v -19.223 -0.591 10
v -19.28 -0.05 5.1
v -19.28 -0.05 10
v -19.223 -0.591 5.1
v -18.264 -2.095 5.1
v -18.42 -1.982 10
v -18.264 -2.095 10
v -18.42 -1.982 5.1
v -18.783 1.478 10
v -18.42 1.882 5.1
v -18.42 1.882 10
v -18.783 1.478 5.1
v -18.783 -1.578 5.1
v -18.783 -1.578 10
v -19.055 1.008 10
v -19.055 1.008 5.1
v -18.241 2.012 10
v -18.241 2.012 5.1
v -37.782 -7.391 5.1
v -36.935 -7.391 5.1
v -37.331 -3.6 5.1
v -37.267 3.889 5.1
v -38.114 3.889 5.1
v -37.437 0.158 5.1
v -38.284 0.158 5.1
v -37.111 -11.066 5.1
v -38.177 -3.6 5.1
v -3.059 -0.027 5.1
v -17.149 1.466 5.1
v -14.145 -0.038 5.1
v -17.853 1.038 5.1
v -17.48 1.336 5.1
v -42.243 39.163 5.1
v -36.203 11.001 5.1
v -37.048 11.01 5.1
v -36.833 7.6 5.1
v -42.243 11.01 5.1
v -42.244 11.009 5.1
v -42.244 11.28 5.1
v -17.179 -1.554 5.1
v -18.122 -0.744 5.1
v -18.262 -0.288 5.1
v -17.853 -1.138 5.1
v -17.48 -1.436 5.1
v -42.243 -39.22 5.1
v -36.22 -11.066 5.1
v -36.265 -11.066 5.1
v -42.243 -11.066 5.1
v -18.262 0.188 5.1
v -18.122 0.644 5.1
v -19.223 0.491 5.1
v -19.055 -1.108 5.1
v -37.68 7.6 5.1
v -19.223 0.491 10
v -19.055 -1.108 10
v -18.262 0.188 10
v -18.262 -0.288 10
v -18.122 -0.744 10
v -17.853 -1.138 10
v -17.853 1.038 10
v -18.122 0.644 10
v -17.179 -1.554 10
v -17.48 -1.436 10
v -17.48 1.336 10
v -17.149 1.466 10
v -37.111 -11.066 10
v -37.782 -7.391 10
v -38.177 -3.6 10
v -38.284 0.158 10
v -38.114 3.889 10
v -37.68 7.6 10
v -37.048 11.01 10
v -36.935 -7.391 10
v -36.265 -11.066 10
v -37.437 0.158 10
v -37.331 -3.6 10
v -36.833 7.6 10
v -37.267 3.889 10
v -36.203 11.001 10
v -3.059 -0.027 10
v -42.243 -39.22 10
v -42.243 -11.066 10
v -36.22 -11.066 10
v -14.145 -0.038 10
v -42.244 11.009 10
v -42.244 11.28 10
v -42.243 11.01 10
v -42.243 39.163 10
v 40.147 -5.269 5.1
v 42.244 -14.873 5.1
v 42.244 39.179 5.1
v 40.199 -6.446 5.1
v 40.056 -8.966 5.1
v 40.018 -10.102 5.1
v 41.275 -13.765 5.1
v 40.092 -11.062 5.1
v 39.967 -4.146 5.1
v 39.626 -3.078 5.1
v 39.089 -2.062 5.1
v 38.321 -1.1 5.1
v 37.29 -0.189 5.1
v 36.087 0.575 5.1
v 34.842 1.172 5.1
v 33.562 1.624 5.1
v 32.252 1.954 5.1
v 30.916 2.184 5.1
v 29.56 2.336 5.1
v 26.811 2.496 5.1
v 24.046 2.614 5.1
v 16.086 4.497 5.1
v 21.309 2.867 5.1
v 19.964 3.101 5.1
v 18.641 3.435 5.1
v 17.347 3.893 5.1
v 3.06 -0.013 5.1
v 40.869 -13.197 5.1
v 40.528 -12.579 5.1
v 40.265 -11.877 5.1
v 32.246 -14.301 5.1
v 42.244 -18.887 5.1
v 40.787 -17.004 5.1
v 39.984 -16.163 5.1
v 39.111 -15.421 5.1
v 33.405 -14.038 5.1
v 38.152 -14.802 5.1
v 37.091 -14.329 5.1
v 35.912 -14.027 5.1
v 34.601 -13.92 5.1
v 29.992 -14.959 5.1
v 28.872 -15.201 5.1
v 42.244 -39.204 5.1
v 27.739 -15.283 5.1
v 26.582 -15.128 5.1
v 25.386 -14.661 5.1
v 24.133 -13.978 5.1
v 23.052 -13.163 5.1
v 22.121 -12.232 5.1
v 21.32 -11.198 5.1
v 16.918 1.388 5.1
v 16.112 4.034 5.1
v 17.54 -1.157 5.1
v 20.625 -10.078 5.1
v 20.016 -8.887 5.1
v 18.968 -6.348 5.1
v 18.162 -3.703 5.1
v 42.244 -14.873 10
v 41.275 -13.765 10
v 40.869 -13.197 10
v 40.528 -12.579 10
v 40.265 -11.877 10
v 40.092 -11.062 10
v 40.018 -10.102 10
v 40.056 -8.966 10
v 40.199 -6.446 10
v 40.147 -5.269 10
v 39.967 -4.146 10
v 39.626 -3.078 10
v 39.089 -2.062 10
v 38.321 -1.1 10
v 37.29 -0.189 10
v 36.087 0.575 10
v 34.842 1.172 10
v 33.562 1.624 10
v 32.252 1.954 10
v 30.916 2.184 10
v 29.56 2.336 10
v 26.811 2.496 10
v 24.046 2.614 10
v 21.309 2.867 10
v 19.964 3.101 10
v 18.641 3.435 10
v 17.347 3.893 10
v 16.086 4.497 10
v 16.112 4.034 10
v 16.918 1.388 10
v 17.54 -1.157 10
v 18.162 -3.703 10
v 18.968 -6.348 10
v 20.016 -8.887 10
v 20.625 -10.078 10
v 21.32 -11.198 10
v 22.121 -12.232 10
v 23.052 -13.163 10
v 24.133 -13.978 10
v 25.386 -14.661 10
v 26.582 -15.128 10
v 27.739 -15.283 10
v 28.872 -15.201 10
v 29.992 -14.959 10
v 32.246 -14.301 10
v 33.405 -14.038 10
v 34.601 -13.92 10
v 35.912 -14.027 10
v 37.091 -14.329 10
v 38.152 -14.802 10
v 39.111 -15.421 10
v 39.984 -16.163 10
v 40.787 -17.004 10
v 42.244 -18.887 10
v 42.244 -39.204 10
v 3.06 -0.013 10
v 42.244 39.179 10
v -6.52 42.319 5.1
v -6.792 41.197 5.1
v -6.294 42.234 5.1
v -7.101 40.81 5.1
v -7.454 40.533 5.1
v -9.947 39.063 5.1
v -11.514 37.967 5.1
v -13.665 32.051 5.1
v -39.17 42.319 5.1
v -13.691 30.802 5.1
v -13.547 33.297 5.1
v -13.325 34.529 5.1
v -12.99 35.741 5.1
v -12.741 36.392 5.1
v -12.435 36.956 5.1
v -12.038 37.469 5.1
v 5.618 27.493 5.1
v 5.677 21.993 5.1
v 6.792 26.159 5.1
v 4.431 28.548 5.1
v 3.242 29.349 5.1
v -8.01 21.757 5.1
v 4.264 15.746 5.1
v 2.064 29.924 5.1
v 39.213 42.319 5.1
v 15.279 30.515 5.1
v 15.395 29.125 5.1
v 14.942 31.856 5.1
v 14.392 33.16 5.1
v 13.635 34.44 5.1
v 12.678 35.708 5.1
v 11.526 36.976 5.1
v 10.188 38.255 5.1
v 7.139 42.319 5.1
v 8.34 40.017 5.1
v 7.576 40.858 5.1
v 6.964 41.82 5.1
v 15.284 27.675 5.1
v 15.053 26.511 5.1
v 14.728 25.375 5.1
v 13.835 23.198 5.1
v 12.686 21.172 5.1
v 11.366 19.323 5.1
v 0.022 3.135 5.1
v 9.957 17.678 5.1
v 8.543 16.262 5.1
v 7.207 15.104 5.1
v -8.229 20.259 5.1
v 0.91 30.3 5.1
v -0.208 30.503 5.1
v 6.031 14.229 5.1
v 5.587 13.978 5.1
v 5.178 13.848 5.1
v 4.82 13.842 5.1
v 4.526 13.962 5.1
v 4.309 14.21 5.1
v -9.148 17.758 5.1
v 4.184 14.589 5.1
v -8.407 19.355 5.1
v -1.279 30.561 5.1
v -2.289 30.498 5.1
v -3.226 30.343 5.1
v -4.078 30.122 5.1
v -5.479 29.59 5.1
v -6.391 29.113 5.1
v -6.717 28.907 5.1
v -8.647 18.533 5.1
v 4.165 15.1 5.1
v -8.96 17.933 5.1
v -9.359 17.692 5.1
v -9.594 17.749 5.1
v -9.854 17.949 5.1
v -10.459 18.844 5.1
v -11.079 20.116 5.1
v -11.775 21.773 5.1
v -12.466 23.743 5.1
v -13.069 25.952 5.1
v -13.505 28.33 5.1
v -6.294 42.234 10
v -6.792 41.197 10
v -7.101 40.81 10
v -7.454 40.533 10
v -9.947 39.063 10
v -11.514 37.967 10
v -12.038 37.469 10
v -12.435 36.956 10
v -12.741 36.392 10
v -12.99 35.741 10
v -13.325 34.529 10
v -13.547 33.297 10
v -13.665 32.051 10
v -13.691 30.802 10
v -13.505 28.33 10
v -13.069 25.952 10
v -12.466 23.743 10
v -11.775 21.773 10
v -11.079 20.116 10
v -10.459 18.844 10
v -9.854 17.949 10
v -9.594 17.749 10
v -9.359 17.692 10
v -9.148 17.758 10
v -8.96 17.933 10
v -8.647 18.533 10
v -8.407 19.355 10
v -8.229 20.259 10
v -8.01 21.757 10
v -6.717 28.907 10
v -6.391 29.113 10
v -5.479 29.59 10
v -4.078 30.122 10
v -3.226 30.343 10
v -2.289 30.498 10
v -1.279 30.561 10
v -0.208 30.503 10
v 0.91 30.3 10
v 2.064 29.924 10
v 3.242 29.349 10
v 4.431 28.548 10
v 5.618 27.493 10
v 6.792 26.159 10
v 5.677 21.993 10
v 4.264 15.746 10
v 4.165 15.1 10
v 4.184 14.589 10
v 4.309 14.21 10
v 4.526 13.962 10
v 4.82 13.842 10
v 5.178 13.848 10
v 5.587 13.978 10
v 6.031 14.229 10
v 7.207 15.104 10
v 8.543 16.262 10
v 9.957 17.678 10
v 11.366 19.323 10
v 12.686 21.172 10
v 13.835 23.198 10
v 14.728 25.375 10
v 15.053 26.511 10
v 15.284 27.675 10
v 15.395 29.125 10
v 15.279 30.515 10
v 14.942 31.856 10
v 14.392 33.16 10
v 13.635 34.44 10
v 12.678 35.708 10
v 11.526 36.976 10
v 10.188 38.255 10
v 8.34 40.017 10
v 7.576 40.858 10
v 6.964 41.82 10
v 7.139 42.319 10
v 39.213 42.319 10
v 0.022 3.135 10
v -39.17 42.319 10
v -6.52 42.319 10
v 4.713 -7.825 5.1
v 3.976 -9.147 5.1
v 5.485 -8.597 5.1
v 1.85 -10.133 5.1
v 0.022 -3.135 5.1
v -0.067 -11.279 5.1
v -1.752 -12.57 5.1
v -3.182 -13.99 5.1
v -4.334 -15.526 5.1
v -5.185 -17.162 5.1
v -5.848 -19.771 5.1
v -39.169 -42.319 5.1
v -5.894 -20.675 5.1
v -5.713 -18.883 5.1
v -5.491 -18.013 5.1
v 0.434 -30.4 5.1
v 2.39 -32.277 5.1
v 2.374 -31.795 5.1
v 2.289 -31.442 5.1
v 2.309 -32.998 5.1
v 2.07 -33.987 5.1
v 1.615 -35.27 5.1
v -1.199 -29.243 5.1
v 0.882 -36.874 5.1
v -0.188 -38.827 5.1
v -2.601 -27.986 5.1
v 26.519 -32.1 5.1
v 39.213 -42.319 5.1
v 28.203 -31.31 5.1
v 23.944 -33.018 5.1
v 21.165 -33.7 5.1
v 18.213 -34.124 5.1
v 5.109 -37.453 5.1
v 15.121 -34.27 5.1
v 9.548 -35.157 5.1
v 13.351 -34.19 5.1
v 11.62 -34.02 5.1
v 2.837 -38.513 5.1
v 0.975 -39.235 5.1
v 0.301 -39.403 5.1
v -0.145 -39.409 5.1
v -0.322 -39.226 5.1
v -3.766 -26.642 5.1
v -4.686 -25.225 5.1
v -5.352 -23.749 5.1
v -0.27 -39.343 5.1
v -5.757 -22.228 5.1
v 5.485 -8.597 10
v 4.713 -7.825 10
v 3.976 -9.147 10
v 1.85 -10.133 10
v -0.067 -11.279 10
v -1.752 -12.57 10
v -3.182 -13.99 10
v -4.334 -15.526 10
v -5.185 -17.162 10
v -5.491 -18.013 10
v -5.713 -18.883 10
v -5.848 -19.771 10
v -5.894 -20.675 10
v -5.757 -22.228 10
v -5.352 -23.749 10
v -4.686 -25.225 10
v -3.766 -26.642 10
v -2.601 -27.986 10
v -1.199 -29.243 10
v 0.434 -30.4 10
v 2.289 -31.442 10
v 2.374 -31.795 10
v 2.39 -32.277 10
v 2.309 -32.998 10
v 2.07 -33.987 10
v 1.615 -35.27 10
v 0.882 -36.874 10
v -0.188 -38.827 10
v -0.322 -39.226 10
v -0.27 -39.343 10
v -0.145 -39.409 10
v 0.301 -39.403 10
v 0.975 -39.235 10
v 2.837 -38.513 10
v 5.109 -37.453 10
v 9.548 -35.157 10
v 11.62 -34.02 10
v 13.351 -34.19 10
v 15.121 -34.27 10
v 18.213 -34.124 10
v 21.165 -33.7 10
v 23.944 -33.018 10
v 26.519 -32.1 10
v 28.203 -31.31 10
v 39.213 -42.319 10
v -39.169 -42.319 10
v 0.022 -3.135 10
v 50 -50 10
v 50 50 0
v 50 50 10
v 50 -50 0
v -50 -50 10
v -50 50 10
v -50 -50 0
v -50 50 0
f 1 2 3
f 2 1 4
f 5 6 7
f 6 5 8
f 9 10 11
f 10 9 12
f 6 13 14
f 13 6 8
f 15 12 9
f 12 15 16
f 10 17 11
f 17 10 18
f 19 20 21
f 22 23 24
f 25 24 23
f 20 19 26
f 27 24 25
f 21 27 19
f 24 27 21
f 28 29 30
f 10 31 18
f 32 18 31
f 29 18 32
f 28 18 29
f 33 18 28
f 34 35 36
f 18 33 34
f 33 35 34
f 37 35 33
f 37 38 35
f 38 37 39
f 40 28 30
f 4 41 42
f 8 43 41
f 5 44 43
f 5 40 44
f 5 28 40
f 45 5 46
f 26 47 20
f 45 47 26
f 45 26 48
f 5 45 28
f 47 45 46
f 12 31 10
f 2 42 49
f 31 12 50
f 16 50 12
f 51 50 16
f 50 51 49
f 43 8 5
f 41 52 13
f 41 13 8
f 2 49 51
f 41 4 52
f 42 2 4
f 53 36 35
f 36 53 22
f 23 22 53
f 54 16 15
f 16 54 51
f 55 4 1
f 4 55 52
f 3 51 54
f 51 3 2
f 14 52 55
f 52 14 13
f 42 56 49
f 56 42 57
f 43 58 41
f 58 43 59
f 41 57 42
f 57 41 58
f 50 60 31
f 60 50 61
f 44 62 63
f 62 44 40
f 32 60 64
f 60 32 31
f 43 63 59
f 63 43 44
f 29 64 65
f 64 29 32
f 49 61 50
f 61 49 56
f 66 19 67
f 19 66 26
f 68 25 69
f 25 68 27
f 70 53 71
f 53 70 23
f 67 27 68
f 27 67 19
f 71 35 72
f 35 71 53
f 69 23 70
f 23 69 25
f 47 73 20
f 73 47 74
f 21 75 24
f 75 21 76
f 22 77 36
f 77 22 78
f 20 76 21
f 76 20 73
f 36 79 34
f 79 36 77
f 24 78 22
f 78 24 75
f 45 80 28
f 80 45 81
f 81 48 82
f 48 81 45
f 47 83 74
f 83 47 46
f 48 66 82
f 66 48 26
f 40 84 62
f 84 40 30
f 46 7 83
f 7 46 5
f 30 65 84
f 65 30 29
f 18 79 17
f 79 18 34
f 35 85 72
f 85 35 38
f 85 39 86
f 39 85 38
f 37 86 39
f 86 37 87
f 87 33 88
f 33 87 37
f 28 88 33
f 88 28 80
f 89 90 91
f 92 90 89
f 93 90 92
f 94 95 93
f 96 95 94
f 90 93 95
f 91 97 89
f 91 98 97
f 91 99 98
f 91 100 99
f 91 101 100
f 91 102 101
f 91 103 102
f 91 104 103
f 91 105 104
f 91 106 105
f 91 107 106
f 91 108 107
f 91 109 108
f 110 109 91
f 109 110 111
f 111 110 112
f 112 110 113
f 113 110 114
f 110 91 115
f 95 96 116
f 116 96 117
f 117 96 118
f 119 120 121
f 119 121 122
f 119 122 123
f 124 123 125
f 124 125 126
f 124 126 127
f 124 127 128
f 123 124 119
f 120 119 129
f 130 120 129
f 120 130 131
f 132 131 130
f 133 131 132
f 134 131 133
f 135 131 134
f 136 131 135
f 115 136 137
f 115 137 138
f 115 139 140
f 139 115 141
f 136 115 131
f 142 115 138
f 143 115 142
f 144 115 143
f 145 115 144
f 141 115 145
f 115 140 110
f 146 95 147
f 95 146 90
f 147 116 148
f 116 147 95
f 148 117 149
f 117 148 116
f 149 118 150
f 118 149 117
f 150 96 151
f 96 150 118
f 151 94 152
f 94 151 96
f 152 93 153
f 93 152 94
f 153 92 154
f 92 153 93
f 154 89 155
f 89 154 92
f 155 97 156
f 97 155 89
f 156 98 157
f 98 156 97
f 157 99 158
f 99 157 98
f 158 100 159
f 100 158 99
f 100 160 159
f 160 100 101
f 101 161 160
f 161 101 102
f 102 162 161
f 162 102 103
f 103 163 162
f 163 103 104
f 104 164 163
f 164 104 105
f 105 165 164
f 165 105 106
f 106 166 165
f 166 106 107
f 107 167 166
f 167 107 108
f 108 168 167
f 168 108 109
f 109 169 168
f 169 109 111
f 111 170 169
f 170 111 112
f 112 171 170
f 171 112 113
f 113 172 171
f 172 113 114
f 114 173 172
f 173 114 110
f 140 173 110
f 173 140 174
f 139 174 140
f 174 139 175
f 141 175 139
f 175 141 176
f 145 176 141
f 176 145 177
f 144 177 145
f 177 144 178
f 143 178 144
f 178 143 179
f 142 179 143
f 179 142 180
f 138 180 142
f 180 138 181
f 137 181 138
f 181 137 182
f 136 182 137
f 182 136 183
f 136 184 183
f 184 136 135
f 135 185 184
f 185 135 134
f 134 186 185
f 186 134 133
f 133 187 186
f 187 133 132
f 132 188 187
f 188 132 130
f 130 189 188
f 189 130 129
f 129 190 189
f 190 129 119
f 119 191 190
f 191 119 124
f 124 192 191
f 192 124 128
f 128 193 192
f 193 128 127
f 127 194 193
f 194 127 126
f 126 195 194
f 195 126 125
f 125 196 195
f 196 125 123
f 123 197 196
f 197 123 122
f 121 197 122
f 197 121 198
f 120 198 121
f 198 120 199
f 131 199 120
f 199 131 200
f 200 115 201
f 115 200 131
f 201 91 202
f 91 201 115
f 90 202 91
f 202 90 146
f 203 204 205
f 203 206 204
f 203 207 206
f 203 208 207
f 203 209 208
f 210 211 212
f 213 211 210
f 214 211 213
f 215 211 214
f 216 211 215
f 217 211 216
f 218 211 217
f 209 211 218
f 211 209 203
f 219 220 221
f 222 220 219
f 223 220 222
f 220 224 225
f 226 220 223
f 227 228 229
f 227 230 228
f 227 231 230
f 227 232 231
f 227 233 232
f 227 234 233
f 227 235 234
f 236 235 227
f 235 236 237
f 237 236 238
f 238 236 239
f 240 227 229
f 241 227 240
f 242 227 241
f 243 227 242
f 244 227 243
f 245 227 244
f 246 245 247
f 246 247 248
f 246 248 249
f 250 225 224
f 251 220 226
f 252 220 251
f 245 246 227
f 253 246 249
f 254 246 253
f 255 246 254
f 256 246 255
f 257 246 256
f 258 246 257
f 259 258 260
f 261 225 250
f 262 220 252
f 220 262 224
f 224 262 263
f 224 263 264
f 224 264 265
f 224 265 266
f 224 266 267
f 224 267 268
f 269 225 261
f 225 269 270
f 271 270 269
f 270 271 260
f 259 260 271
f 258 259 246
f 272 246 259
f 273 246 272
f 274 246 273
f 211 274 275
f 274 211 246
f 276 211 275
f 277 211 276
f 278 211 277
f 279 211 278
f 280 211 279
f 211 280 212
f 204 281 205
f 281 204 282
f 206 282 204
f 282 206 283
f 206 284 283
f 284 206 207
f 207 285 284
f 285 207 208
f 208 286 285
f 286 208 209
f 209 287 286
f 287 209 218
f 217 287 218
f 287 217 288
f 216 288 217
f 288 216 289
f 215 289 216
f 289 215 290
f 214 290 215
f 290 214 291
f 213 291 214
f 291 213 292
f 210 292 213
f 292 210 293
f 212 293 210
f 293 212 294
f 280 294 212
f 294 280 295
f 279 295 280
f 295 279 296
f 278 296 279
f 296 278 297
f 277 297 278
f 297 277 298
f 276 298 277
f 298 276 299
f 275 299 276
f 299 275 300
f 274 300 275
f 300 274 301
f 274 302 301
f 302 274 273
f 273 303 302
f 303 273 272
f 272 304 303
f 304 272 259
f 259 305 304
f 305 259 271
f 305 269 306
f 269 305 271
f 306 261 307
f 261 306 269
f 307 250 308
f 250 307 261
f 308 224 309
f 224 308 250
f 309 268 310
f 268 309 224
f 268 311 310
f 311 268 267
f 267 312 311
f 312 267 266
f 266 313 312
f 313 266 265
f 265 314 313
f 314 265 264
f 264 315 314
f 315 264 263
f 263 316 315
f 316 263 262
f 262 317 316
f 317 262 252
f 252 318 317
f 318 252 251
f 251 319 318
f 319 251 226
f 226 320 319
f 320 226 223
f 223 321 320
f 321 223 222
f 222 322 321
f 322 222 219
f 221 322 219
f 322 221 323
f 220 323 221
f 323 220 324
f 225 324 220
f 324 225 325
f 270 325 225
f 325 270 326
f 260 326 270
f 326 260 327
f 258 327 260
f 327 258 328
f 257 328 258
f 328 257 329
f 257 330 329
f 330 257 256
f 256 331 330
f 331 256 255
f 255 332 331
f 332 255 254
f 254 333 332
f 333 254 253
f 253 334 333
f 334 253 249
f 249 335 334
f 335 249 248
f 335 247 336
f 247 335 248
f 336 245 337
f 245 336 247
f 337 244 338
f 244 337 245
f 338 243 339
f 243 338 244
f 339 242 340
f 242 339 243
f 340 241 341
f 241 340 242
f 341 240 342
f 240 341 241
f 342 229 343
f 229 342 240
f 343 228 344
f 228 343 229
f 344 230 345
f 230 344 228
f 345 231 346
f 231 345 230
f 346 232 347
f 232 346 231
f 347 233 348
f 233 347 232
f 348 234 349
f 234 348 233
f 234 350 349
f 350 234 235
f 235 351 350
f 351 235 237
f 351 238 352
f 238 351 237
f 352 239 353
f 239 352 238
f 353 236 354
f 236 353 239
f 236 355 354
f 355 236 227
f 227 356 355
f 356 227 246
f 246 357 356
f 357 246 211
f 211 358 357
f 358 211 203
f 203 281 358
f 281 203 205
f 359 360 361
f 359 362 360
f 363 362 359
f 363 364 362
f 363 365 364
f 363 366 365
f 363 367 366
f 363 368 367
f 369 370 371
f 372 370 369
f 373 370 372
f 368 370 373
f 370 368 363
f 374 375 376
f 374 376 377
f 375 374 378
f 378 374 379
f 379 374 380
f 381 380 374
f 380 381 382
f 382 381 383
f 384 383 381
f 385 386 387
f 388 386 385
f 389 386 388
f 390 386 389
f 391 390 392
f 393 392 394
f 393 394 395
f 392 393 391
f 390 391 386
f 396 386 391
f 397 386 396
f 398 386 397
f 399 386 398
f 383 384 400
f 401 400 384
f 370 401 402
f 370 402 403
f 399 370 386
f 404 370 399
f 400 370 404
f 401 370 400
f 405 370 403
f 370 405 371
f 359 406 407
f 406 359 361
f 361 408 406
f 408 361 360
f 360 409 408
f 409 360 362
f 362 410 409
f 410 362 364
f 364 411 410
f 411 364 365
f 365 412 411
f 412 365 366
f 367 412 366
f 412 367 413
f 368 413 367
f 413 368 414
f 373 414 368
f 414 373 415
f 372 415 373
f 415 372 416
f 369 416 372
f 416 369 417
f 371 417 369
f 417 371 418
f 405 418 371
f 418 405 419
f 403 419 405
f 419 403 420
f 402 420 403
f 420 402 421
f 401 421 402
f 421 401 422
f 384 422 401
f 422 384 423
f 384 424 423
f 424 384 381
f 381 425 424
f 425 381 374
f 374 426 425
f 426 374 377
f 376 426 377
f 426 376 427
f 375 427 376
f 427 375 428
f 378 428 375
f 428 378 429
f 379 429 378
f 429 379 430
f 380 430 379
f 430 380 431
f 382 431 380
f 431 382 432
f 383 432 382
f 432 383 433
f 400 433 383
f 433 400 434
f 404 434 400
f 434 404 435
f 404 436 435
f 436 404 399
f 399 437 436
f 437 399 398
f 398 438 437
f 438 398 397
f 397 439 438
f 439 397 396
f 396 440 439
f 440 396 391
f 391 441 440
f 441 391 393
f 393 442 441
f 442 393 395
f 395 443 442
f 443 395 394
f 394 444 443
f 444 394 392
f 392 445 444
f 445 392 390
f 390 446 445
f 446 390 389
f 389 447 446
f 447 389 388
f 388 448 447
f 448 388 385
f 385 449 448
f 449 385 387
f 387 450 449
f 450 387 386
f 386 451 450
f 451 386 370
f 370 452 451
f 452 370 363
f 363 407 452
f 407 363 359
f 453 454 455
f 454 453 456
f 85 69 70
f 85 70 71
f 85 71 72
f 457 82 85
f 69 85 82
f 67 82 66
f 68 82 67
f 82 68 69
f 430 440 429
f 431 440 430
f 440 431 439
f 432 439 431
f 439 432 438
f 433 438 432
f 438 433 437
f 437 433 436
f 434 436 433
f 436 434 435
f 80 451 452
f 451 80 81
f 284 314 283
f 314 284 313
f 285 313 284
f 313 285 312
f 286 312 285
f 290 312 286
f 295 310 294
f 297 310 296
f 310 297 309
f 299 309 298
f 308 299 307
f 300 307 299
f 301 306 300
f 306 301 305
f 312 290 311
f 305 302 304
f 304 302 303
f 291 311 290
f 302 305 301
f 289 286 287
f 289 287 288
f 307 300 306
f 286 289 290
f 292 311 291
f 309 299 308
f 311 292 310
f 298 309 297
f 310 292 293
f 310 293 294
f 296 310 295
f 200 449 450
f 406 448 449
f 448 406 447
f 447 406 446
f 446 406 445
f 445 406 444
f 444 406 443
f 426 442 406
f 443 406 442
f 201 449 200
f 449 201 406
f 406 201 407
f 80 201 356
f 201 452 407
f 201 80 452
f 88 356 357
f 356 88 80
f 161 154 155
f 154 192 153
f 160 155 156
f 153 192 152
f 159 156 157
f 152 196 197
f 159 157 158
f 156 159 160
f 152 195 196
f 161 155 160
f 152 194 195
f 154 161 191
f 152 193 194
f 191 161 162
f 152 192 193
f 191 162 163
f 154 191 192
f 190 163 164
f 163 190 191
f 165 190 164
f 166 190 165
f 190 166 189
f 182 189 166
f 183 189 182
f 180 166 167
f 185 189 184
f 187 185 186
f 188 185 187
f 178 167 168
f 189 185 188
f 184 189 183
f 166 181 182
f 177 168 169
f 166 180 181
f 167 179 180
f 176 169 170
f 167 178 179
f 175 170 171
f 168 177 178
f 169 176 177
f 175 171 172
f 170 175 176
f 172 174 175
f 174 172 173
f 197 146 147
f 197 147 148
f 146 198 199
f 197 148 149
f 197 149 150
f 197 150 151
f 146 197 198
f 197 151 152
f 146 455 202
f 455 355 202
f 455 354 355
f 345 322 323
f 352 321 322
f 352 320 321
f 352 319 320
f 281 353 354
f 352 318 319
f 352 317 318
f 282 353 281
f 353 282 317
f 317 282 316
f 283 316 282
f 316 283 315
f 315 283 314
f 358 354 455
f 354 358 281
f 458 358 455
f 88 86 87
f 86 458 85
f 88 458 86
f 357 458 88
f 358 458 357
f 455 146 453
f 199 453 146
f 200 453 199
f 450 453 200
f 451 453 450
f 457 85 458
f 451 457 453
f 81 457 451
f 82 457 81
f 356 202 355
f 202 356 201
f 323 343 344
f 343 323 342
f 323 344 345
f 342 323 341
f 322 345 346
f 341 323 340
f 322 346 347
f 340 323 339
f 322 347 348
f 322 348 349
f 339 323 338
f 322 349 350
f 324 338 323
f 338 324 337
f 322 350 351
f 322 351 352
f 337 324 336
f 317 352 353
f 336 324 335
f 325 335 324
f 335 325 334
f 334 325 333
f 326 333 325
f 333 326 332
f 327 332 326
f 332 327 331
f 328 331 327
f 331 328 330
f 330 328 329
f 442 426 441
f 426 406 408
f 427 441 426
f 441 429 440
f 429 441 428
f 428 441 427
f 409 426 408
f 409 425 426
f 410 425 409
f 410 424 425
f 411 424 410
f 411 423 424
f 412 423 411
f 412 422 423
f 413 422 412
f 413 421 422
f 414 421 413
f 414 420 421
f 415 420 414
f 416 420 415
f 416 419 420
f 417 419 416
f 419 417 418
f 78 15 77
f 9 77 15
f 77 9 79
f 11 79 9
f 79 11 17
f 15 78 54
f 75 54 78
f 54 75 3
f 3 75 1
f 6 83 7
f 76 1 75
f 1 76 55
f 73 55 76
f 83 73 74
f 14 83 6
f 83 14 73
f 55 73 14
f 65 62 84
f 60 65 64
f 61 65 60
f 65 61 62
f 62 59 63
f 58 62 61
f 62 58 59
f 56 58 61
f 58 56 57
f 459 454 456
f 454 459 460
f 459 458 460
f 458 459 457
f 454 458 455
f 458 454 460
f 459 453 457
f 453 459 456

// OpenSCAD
// Module names are of the form poly_<inkscape-path-id>().  As a result,
// you can associate a polygon in this OpenSCAD program with the corresponding
// SVG element in the Inkscape document by looking for the XML element with
// the attribute id="inkscape-path-id".

// fudge value is used to ensure that subtracted solids are a tad taller
// in the z dimension than the polygon being subtracted from.  This helps
// keep the resulting .stl file manifold.
fudge = 0.1;
height = 5;

module poly_sustainability(h)
{
  scale([25.4/90, -25.4/90, 1]) union()
  {
    linear_extrude(height=h)
      polygon([[119.059500,49.321938],[114.820081,49.739379],[110.714930,50.672563],[102.729188,53.003813],[98.759476,53.860707],[94.745789,54.151000],[90.643567,53.604105],[86.408250,51.949438],[81.966543,49.529252],[78.135691,46.642016],[74.838658,43.340990],[71.998406,39.679438],[69.537901,35.710619],[67.380105,31.487797],[63.664500,22.493188],[60.810105,13.119672],[58.605281,4.101000],[56.400691,-4.918141],[53.547000,-14.293062],[53.454500,-15.934312],[57.922292,-13.795368],[62.508553,-12.172638],[67.194408,-10.986966],[71.960984,-10.159195],[81.660799,-9.260733],[91.457000,-8.844000],[101.198592,-8.275743],[106.001723,-7.736902],[110.734578,-6.922711],[115.378283,-5.754013],[119.913963,-4.151651],[124.322743,-2.036470],[128.585750,0.670688],[132.240567,3.896293],[134.959598,7.307172],[136.863619,10.905199],[138.073406,14.692250],[138.709737,18.670199],[138.893387,22.840922],[138.385750,31.768188],[138.252571,35.795016],[138.513758,39.196957],[139.129612,42.084943],[140.060437,44.569906],[141.266536,46.762780],[142.708211,48.774496],[146.139500,52.698188],[146.139500,-138.824312],[7.299500,0.045688],[146.139500,138.911938],[146.139500,66.921938],[140.978191,60.251137],[138.133609,57.271657],[135.039344,54.642406],[131.640098,52.448097],[127.880574,50.773441],[123.705474,49.703151]]);
  }
}

module poly_make(h)
{
  scale([25.4/90, -25.4/90, 1]) union()
  {
    linear_extrude(height=h)
      polygon([[25.294875,-146.406813],[138.944875,-146.406813],[0.078625,-7.564312],[-138.790125,-146.406813],[-23.101375,-146.406813],[-22.301375,-146.104312],[-24.065906,-142.430094],[-25.161512,-141.058512],[-26.412625,-140.076813],[-35.245926,-134.869059],[-40.798094,-130.985406],[-42.653897,-129.220306],[-44.061590,-127.402457],[-45.145230,-125.403934],[-46.028875,-123.096813],[-47.214939,-118.805053],[-48.000101,-114.436529],[-48.420362,-110.023401],[-48.511727,-105.597828],[-47.851771,-96.837994],[-46.308250,-88.414313],[-44.169183,-80.584068],[-41.722586,-73.604547],[-39.256478,-67.733033],[-37.058875,-63.226813],[-34.916651,-60.055699],[-33.993017,-59.347848],[-33.160691,-59.143141],[-32.414419,-59.380084],[-31.748941,-59.997184],[-30.639344,-62.125875],[-29.789844,-65.037262],[-29.158387,-68.239391],[-28.381375,-73.548063],[-23.801375,-98.883062],[-22.646038,-99.613863],[-19.412820,-101.301734],[-14.450911,-103.189879],[-11.430819,-103.972555],[-8.109500,-104.521500],[-4.530603,-104.742115],[-0.737776,-104.539801],[3.225331,-103.819957],[7.315070,-102.487984],[11.487793,-100.449283],[15.699851,-97.609254],[19.907594,-93.873297],[24.067375,-89.146813],[20.115500,-74.382906],[15.109875,-52.249313],[14.757270,-49.960501],[14.826613,-48.149449],[15.269111,-46.808290],[16.035969,-45.929156],[17.078393,-45.504183],[18.347590,-45.525504],[19.794765,-45.985252],[21.371125,-46.875563],[25.535231,-49.975470],[30.270070,-54.079586],[35.280827,-59.093722],[40.272687,-64.923688],[44.950837,-71.475294],[49.020461,-78.654352],[52.186745,-86.366671],[53.339005,-90.393370],[54.154875,-94.518062],[54.548017,-99.656607],[54.137121,-104.580172],[52.945610,-109.331588],[50.996906,-113.953688],[48.314433,-118.489303],[44.921613,-122.981266],[40.841870,-127.472408],[36.098625,-132.005563],[29.552375,-138.249469],[26.843039,-141.229684],[24.674875,-144.636812],[25.294875,-146.406813]]);
  }
}

module poly_creatitvity(h)
{
  union() {
    scale([25.4/90, -25.4/90, 1])
    {
      linear_extrude(height=h)
        polygon([[-146.139500,-39.966937],[-146.139500,-39.009437],[-124.800750,-39.011937],[-46.575750,0.133063],[-124.795750,39.211813],[-143.664500,39.211813],[-146.138250,39.211813],[-146.138250,138.968063],[-7.297000,0.096813],[-146.138250,-138.768187],[-146.138250,-39.011937]]);
    }

    difference() {
      translate([-15.68, -0.05, 0])
      cylinder(h=h, r=2.6, $fs=0.5);

      translate([-15.68, -0.05, -h/2])
      scale([1,1,2])
      cylinder(h=h, r=1.6, $fs=0.5);

      translate([-13.68, -0.05, -h/2])
      scale([1,1,2])
      cylinder(h=h, r=1.6, $fs=0.5);
    }
    poly_border(h);
  }
}

module poly_border(h)
{
  translate([0.3, 0, 0])
  scale([25.4/90, -25.4/90, 1])
  {
    difference() {
      scale([1, 1.2, 1])
      bow(h);

      translate([ 3, 0, -h/2])
      scale([1,1.2,2])
      bow(h);
    }
  }
}

module bow(h) {
  linear_extrude(height=h)
    polygon([[-125.332625,-44.244312],[-128.603252,-33.355375],[-131.030145,-22.440934],[-132.567847,-11.483456],[-133.170906,-0.465406],[-132.793868,10.630749],[-131.391277,21.822543],[-128.917681,33.127511],[-125.327625,44.563188]]);
}

module poly_tip(h)
{
  scale([25.4/90, -25.4/90, 1]) union()
  {
    linear_extrude(height=h)
      polygon([[-46.478250,0.159938],[-46.663282,1.994305],[-47.193973,3.703238],[-48.033716,5.250013],[-49.145906,6.597906],[-50.493936,7.710194],[-52.041199,8.550152],[-53.751089,9.081058],[-55.587000,9.266188],[-57.422444,9.081058],[-59.131883,8.550152],[-60.678724,7.710194],[-62.026375,6.597906],[-63.138245,5.250013],[-63.977742,3.703238],[-64.508274,1.994305],[-64.693250,0.159938],[-64.508274,-1.676081],[-63.977742,-3.386254],[-63.138245,-4.933917],[-62.026375,-6.282406],[-60.678724,-7.395055],[-59.131883,-8.235199],[-57.422444,-8.766173],[-55.587000,-8.951313],[-53.751089,-8.766173],[-52.041199,-8.235199],[-50.493936,-7.395055],[-49.145906,-6.282406],[-48.033716,-4.933917],[-47.193973,-3.386254],[-46.663282,-1.676081],[-46.478250,0.159938]]);
  }
}

module poly_social(h)
{
  scale([25.4/90, -25.4/90, 1]) union()
  {
    linear_extrude(height=h)
      polygon([[99.931125,107.398063],[93.964875,110.195563],[84.841145,113.449215],[74.992844,115.865094],[64.533996,117.369020],[53.578625,117.886813],[47.306281,117.601188],[41.173625,117.000563],[33.830168,121.030191],[18.104406,129.165719],[10.053447,132.920057],[3.453254,135.477105],[1.066606,136.075004],[-0.514058,136.095609],[-0.955969,135.860471],[-1.140973,135.446264],[-0.666375,134.034313],[3.124208,127.112831],[5.720871,121.427457],[7.335825,116.881644],[8.181281,113.378844],[8.469453,110.822508],[8.412551,109.116090],[8.112375,107.866813],[1.538410,104.172823],[-4.247234,100.074039],[-9.217371,95.619298],[-13.344812,90.857438],[-16.602371,85.837296],[-18.962859,80.607711],[-20.399090,75.217521],[-20.883875,69.715563],[-20.722091,66.512633],[-20.243042,63.365719],[-19.456886,60.281383],[-18.373777,57.266188],[-15.357334,51.469469],[-11.274969,46.028063],[-6.207935,40.994469],[-0.237488,36.421188],[6.555117,32.360719],[14.088625,28.865563],[19.436125,26.919313],[16.698625,24.183063],[0.078625,7.564313],[-138.788875,146.406813],[138.944875,146.406813],[99.931125,107.398063]]);
  }
}
module logo()
{
  union() {
    translate([1, 0, 0])
    poly_sustainability(height);

    translate([0, 1, 0])
    poly_make(height);

    translate([-1, 0, 0])
    poly_creatitvity(height);

    translate([0, -1, 0])
    poly_social(height);

    //cylinder(h=height/2, r=5, $fs=1);
  }
}

difference() {
  translate([-50, -50, 0])
  cube([100, 100, height*2]);

  translate([0, 0, height+0.1])
  logo();
}
